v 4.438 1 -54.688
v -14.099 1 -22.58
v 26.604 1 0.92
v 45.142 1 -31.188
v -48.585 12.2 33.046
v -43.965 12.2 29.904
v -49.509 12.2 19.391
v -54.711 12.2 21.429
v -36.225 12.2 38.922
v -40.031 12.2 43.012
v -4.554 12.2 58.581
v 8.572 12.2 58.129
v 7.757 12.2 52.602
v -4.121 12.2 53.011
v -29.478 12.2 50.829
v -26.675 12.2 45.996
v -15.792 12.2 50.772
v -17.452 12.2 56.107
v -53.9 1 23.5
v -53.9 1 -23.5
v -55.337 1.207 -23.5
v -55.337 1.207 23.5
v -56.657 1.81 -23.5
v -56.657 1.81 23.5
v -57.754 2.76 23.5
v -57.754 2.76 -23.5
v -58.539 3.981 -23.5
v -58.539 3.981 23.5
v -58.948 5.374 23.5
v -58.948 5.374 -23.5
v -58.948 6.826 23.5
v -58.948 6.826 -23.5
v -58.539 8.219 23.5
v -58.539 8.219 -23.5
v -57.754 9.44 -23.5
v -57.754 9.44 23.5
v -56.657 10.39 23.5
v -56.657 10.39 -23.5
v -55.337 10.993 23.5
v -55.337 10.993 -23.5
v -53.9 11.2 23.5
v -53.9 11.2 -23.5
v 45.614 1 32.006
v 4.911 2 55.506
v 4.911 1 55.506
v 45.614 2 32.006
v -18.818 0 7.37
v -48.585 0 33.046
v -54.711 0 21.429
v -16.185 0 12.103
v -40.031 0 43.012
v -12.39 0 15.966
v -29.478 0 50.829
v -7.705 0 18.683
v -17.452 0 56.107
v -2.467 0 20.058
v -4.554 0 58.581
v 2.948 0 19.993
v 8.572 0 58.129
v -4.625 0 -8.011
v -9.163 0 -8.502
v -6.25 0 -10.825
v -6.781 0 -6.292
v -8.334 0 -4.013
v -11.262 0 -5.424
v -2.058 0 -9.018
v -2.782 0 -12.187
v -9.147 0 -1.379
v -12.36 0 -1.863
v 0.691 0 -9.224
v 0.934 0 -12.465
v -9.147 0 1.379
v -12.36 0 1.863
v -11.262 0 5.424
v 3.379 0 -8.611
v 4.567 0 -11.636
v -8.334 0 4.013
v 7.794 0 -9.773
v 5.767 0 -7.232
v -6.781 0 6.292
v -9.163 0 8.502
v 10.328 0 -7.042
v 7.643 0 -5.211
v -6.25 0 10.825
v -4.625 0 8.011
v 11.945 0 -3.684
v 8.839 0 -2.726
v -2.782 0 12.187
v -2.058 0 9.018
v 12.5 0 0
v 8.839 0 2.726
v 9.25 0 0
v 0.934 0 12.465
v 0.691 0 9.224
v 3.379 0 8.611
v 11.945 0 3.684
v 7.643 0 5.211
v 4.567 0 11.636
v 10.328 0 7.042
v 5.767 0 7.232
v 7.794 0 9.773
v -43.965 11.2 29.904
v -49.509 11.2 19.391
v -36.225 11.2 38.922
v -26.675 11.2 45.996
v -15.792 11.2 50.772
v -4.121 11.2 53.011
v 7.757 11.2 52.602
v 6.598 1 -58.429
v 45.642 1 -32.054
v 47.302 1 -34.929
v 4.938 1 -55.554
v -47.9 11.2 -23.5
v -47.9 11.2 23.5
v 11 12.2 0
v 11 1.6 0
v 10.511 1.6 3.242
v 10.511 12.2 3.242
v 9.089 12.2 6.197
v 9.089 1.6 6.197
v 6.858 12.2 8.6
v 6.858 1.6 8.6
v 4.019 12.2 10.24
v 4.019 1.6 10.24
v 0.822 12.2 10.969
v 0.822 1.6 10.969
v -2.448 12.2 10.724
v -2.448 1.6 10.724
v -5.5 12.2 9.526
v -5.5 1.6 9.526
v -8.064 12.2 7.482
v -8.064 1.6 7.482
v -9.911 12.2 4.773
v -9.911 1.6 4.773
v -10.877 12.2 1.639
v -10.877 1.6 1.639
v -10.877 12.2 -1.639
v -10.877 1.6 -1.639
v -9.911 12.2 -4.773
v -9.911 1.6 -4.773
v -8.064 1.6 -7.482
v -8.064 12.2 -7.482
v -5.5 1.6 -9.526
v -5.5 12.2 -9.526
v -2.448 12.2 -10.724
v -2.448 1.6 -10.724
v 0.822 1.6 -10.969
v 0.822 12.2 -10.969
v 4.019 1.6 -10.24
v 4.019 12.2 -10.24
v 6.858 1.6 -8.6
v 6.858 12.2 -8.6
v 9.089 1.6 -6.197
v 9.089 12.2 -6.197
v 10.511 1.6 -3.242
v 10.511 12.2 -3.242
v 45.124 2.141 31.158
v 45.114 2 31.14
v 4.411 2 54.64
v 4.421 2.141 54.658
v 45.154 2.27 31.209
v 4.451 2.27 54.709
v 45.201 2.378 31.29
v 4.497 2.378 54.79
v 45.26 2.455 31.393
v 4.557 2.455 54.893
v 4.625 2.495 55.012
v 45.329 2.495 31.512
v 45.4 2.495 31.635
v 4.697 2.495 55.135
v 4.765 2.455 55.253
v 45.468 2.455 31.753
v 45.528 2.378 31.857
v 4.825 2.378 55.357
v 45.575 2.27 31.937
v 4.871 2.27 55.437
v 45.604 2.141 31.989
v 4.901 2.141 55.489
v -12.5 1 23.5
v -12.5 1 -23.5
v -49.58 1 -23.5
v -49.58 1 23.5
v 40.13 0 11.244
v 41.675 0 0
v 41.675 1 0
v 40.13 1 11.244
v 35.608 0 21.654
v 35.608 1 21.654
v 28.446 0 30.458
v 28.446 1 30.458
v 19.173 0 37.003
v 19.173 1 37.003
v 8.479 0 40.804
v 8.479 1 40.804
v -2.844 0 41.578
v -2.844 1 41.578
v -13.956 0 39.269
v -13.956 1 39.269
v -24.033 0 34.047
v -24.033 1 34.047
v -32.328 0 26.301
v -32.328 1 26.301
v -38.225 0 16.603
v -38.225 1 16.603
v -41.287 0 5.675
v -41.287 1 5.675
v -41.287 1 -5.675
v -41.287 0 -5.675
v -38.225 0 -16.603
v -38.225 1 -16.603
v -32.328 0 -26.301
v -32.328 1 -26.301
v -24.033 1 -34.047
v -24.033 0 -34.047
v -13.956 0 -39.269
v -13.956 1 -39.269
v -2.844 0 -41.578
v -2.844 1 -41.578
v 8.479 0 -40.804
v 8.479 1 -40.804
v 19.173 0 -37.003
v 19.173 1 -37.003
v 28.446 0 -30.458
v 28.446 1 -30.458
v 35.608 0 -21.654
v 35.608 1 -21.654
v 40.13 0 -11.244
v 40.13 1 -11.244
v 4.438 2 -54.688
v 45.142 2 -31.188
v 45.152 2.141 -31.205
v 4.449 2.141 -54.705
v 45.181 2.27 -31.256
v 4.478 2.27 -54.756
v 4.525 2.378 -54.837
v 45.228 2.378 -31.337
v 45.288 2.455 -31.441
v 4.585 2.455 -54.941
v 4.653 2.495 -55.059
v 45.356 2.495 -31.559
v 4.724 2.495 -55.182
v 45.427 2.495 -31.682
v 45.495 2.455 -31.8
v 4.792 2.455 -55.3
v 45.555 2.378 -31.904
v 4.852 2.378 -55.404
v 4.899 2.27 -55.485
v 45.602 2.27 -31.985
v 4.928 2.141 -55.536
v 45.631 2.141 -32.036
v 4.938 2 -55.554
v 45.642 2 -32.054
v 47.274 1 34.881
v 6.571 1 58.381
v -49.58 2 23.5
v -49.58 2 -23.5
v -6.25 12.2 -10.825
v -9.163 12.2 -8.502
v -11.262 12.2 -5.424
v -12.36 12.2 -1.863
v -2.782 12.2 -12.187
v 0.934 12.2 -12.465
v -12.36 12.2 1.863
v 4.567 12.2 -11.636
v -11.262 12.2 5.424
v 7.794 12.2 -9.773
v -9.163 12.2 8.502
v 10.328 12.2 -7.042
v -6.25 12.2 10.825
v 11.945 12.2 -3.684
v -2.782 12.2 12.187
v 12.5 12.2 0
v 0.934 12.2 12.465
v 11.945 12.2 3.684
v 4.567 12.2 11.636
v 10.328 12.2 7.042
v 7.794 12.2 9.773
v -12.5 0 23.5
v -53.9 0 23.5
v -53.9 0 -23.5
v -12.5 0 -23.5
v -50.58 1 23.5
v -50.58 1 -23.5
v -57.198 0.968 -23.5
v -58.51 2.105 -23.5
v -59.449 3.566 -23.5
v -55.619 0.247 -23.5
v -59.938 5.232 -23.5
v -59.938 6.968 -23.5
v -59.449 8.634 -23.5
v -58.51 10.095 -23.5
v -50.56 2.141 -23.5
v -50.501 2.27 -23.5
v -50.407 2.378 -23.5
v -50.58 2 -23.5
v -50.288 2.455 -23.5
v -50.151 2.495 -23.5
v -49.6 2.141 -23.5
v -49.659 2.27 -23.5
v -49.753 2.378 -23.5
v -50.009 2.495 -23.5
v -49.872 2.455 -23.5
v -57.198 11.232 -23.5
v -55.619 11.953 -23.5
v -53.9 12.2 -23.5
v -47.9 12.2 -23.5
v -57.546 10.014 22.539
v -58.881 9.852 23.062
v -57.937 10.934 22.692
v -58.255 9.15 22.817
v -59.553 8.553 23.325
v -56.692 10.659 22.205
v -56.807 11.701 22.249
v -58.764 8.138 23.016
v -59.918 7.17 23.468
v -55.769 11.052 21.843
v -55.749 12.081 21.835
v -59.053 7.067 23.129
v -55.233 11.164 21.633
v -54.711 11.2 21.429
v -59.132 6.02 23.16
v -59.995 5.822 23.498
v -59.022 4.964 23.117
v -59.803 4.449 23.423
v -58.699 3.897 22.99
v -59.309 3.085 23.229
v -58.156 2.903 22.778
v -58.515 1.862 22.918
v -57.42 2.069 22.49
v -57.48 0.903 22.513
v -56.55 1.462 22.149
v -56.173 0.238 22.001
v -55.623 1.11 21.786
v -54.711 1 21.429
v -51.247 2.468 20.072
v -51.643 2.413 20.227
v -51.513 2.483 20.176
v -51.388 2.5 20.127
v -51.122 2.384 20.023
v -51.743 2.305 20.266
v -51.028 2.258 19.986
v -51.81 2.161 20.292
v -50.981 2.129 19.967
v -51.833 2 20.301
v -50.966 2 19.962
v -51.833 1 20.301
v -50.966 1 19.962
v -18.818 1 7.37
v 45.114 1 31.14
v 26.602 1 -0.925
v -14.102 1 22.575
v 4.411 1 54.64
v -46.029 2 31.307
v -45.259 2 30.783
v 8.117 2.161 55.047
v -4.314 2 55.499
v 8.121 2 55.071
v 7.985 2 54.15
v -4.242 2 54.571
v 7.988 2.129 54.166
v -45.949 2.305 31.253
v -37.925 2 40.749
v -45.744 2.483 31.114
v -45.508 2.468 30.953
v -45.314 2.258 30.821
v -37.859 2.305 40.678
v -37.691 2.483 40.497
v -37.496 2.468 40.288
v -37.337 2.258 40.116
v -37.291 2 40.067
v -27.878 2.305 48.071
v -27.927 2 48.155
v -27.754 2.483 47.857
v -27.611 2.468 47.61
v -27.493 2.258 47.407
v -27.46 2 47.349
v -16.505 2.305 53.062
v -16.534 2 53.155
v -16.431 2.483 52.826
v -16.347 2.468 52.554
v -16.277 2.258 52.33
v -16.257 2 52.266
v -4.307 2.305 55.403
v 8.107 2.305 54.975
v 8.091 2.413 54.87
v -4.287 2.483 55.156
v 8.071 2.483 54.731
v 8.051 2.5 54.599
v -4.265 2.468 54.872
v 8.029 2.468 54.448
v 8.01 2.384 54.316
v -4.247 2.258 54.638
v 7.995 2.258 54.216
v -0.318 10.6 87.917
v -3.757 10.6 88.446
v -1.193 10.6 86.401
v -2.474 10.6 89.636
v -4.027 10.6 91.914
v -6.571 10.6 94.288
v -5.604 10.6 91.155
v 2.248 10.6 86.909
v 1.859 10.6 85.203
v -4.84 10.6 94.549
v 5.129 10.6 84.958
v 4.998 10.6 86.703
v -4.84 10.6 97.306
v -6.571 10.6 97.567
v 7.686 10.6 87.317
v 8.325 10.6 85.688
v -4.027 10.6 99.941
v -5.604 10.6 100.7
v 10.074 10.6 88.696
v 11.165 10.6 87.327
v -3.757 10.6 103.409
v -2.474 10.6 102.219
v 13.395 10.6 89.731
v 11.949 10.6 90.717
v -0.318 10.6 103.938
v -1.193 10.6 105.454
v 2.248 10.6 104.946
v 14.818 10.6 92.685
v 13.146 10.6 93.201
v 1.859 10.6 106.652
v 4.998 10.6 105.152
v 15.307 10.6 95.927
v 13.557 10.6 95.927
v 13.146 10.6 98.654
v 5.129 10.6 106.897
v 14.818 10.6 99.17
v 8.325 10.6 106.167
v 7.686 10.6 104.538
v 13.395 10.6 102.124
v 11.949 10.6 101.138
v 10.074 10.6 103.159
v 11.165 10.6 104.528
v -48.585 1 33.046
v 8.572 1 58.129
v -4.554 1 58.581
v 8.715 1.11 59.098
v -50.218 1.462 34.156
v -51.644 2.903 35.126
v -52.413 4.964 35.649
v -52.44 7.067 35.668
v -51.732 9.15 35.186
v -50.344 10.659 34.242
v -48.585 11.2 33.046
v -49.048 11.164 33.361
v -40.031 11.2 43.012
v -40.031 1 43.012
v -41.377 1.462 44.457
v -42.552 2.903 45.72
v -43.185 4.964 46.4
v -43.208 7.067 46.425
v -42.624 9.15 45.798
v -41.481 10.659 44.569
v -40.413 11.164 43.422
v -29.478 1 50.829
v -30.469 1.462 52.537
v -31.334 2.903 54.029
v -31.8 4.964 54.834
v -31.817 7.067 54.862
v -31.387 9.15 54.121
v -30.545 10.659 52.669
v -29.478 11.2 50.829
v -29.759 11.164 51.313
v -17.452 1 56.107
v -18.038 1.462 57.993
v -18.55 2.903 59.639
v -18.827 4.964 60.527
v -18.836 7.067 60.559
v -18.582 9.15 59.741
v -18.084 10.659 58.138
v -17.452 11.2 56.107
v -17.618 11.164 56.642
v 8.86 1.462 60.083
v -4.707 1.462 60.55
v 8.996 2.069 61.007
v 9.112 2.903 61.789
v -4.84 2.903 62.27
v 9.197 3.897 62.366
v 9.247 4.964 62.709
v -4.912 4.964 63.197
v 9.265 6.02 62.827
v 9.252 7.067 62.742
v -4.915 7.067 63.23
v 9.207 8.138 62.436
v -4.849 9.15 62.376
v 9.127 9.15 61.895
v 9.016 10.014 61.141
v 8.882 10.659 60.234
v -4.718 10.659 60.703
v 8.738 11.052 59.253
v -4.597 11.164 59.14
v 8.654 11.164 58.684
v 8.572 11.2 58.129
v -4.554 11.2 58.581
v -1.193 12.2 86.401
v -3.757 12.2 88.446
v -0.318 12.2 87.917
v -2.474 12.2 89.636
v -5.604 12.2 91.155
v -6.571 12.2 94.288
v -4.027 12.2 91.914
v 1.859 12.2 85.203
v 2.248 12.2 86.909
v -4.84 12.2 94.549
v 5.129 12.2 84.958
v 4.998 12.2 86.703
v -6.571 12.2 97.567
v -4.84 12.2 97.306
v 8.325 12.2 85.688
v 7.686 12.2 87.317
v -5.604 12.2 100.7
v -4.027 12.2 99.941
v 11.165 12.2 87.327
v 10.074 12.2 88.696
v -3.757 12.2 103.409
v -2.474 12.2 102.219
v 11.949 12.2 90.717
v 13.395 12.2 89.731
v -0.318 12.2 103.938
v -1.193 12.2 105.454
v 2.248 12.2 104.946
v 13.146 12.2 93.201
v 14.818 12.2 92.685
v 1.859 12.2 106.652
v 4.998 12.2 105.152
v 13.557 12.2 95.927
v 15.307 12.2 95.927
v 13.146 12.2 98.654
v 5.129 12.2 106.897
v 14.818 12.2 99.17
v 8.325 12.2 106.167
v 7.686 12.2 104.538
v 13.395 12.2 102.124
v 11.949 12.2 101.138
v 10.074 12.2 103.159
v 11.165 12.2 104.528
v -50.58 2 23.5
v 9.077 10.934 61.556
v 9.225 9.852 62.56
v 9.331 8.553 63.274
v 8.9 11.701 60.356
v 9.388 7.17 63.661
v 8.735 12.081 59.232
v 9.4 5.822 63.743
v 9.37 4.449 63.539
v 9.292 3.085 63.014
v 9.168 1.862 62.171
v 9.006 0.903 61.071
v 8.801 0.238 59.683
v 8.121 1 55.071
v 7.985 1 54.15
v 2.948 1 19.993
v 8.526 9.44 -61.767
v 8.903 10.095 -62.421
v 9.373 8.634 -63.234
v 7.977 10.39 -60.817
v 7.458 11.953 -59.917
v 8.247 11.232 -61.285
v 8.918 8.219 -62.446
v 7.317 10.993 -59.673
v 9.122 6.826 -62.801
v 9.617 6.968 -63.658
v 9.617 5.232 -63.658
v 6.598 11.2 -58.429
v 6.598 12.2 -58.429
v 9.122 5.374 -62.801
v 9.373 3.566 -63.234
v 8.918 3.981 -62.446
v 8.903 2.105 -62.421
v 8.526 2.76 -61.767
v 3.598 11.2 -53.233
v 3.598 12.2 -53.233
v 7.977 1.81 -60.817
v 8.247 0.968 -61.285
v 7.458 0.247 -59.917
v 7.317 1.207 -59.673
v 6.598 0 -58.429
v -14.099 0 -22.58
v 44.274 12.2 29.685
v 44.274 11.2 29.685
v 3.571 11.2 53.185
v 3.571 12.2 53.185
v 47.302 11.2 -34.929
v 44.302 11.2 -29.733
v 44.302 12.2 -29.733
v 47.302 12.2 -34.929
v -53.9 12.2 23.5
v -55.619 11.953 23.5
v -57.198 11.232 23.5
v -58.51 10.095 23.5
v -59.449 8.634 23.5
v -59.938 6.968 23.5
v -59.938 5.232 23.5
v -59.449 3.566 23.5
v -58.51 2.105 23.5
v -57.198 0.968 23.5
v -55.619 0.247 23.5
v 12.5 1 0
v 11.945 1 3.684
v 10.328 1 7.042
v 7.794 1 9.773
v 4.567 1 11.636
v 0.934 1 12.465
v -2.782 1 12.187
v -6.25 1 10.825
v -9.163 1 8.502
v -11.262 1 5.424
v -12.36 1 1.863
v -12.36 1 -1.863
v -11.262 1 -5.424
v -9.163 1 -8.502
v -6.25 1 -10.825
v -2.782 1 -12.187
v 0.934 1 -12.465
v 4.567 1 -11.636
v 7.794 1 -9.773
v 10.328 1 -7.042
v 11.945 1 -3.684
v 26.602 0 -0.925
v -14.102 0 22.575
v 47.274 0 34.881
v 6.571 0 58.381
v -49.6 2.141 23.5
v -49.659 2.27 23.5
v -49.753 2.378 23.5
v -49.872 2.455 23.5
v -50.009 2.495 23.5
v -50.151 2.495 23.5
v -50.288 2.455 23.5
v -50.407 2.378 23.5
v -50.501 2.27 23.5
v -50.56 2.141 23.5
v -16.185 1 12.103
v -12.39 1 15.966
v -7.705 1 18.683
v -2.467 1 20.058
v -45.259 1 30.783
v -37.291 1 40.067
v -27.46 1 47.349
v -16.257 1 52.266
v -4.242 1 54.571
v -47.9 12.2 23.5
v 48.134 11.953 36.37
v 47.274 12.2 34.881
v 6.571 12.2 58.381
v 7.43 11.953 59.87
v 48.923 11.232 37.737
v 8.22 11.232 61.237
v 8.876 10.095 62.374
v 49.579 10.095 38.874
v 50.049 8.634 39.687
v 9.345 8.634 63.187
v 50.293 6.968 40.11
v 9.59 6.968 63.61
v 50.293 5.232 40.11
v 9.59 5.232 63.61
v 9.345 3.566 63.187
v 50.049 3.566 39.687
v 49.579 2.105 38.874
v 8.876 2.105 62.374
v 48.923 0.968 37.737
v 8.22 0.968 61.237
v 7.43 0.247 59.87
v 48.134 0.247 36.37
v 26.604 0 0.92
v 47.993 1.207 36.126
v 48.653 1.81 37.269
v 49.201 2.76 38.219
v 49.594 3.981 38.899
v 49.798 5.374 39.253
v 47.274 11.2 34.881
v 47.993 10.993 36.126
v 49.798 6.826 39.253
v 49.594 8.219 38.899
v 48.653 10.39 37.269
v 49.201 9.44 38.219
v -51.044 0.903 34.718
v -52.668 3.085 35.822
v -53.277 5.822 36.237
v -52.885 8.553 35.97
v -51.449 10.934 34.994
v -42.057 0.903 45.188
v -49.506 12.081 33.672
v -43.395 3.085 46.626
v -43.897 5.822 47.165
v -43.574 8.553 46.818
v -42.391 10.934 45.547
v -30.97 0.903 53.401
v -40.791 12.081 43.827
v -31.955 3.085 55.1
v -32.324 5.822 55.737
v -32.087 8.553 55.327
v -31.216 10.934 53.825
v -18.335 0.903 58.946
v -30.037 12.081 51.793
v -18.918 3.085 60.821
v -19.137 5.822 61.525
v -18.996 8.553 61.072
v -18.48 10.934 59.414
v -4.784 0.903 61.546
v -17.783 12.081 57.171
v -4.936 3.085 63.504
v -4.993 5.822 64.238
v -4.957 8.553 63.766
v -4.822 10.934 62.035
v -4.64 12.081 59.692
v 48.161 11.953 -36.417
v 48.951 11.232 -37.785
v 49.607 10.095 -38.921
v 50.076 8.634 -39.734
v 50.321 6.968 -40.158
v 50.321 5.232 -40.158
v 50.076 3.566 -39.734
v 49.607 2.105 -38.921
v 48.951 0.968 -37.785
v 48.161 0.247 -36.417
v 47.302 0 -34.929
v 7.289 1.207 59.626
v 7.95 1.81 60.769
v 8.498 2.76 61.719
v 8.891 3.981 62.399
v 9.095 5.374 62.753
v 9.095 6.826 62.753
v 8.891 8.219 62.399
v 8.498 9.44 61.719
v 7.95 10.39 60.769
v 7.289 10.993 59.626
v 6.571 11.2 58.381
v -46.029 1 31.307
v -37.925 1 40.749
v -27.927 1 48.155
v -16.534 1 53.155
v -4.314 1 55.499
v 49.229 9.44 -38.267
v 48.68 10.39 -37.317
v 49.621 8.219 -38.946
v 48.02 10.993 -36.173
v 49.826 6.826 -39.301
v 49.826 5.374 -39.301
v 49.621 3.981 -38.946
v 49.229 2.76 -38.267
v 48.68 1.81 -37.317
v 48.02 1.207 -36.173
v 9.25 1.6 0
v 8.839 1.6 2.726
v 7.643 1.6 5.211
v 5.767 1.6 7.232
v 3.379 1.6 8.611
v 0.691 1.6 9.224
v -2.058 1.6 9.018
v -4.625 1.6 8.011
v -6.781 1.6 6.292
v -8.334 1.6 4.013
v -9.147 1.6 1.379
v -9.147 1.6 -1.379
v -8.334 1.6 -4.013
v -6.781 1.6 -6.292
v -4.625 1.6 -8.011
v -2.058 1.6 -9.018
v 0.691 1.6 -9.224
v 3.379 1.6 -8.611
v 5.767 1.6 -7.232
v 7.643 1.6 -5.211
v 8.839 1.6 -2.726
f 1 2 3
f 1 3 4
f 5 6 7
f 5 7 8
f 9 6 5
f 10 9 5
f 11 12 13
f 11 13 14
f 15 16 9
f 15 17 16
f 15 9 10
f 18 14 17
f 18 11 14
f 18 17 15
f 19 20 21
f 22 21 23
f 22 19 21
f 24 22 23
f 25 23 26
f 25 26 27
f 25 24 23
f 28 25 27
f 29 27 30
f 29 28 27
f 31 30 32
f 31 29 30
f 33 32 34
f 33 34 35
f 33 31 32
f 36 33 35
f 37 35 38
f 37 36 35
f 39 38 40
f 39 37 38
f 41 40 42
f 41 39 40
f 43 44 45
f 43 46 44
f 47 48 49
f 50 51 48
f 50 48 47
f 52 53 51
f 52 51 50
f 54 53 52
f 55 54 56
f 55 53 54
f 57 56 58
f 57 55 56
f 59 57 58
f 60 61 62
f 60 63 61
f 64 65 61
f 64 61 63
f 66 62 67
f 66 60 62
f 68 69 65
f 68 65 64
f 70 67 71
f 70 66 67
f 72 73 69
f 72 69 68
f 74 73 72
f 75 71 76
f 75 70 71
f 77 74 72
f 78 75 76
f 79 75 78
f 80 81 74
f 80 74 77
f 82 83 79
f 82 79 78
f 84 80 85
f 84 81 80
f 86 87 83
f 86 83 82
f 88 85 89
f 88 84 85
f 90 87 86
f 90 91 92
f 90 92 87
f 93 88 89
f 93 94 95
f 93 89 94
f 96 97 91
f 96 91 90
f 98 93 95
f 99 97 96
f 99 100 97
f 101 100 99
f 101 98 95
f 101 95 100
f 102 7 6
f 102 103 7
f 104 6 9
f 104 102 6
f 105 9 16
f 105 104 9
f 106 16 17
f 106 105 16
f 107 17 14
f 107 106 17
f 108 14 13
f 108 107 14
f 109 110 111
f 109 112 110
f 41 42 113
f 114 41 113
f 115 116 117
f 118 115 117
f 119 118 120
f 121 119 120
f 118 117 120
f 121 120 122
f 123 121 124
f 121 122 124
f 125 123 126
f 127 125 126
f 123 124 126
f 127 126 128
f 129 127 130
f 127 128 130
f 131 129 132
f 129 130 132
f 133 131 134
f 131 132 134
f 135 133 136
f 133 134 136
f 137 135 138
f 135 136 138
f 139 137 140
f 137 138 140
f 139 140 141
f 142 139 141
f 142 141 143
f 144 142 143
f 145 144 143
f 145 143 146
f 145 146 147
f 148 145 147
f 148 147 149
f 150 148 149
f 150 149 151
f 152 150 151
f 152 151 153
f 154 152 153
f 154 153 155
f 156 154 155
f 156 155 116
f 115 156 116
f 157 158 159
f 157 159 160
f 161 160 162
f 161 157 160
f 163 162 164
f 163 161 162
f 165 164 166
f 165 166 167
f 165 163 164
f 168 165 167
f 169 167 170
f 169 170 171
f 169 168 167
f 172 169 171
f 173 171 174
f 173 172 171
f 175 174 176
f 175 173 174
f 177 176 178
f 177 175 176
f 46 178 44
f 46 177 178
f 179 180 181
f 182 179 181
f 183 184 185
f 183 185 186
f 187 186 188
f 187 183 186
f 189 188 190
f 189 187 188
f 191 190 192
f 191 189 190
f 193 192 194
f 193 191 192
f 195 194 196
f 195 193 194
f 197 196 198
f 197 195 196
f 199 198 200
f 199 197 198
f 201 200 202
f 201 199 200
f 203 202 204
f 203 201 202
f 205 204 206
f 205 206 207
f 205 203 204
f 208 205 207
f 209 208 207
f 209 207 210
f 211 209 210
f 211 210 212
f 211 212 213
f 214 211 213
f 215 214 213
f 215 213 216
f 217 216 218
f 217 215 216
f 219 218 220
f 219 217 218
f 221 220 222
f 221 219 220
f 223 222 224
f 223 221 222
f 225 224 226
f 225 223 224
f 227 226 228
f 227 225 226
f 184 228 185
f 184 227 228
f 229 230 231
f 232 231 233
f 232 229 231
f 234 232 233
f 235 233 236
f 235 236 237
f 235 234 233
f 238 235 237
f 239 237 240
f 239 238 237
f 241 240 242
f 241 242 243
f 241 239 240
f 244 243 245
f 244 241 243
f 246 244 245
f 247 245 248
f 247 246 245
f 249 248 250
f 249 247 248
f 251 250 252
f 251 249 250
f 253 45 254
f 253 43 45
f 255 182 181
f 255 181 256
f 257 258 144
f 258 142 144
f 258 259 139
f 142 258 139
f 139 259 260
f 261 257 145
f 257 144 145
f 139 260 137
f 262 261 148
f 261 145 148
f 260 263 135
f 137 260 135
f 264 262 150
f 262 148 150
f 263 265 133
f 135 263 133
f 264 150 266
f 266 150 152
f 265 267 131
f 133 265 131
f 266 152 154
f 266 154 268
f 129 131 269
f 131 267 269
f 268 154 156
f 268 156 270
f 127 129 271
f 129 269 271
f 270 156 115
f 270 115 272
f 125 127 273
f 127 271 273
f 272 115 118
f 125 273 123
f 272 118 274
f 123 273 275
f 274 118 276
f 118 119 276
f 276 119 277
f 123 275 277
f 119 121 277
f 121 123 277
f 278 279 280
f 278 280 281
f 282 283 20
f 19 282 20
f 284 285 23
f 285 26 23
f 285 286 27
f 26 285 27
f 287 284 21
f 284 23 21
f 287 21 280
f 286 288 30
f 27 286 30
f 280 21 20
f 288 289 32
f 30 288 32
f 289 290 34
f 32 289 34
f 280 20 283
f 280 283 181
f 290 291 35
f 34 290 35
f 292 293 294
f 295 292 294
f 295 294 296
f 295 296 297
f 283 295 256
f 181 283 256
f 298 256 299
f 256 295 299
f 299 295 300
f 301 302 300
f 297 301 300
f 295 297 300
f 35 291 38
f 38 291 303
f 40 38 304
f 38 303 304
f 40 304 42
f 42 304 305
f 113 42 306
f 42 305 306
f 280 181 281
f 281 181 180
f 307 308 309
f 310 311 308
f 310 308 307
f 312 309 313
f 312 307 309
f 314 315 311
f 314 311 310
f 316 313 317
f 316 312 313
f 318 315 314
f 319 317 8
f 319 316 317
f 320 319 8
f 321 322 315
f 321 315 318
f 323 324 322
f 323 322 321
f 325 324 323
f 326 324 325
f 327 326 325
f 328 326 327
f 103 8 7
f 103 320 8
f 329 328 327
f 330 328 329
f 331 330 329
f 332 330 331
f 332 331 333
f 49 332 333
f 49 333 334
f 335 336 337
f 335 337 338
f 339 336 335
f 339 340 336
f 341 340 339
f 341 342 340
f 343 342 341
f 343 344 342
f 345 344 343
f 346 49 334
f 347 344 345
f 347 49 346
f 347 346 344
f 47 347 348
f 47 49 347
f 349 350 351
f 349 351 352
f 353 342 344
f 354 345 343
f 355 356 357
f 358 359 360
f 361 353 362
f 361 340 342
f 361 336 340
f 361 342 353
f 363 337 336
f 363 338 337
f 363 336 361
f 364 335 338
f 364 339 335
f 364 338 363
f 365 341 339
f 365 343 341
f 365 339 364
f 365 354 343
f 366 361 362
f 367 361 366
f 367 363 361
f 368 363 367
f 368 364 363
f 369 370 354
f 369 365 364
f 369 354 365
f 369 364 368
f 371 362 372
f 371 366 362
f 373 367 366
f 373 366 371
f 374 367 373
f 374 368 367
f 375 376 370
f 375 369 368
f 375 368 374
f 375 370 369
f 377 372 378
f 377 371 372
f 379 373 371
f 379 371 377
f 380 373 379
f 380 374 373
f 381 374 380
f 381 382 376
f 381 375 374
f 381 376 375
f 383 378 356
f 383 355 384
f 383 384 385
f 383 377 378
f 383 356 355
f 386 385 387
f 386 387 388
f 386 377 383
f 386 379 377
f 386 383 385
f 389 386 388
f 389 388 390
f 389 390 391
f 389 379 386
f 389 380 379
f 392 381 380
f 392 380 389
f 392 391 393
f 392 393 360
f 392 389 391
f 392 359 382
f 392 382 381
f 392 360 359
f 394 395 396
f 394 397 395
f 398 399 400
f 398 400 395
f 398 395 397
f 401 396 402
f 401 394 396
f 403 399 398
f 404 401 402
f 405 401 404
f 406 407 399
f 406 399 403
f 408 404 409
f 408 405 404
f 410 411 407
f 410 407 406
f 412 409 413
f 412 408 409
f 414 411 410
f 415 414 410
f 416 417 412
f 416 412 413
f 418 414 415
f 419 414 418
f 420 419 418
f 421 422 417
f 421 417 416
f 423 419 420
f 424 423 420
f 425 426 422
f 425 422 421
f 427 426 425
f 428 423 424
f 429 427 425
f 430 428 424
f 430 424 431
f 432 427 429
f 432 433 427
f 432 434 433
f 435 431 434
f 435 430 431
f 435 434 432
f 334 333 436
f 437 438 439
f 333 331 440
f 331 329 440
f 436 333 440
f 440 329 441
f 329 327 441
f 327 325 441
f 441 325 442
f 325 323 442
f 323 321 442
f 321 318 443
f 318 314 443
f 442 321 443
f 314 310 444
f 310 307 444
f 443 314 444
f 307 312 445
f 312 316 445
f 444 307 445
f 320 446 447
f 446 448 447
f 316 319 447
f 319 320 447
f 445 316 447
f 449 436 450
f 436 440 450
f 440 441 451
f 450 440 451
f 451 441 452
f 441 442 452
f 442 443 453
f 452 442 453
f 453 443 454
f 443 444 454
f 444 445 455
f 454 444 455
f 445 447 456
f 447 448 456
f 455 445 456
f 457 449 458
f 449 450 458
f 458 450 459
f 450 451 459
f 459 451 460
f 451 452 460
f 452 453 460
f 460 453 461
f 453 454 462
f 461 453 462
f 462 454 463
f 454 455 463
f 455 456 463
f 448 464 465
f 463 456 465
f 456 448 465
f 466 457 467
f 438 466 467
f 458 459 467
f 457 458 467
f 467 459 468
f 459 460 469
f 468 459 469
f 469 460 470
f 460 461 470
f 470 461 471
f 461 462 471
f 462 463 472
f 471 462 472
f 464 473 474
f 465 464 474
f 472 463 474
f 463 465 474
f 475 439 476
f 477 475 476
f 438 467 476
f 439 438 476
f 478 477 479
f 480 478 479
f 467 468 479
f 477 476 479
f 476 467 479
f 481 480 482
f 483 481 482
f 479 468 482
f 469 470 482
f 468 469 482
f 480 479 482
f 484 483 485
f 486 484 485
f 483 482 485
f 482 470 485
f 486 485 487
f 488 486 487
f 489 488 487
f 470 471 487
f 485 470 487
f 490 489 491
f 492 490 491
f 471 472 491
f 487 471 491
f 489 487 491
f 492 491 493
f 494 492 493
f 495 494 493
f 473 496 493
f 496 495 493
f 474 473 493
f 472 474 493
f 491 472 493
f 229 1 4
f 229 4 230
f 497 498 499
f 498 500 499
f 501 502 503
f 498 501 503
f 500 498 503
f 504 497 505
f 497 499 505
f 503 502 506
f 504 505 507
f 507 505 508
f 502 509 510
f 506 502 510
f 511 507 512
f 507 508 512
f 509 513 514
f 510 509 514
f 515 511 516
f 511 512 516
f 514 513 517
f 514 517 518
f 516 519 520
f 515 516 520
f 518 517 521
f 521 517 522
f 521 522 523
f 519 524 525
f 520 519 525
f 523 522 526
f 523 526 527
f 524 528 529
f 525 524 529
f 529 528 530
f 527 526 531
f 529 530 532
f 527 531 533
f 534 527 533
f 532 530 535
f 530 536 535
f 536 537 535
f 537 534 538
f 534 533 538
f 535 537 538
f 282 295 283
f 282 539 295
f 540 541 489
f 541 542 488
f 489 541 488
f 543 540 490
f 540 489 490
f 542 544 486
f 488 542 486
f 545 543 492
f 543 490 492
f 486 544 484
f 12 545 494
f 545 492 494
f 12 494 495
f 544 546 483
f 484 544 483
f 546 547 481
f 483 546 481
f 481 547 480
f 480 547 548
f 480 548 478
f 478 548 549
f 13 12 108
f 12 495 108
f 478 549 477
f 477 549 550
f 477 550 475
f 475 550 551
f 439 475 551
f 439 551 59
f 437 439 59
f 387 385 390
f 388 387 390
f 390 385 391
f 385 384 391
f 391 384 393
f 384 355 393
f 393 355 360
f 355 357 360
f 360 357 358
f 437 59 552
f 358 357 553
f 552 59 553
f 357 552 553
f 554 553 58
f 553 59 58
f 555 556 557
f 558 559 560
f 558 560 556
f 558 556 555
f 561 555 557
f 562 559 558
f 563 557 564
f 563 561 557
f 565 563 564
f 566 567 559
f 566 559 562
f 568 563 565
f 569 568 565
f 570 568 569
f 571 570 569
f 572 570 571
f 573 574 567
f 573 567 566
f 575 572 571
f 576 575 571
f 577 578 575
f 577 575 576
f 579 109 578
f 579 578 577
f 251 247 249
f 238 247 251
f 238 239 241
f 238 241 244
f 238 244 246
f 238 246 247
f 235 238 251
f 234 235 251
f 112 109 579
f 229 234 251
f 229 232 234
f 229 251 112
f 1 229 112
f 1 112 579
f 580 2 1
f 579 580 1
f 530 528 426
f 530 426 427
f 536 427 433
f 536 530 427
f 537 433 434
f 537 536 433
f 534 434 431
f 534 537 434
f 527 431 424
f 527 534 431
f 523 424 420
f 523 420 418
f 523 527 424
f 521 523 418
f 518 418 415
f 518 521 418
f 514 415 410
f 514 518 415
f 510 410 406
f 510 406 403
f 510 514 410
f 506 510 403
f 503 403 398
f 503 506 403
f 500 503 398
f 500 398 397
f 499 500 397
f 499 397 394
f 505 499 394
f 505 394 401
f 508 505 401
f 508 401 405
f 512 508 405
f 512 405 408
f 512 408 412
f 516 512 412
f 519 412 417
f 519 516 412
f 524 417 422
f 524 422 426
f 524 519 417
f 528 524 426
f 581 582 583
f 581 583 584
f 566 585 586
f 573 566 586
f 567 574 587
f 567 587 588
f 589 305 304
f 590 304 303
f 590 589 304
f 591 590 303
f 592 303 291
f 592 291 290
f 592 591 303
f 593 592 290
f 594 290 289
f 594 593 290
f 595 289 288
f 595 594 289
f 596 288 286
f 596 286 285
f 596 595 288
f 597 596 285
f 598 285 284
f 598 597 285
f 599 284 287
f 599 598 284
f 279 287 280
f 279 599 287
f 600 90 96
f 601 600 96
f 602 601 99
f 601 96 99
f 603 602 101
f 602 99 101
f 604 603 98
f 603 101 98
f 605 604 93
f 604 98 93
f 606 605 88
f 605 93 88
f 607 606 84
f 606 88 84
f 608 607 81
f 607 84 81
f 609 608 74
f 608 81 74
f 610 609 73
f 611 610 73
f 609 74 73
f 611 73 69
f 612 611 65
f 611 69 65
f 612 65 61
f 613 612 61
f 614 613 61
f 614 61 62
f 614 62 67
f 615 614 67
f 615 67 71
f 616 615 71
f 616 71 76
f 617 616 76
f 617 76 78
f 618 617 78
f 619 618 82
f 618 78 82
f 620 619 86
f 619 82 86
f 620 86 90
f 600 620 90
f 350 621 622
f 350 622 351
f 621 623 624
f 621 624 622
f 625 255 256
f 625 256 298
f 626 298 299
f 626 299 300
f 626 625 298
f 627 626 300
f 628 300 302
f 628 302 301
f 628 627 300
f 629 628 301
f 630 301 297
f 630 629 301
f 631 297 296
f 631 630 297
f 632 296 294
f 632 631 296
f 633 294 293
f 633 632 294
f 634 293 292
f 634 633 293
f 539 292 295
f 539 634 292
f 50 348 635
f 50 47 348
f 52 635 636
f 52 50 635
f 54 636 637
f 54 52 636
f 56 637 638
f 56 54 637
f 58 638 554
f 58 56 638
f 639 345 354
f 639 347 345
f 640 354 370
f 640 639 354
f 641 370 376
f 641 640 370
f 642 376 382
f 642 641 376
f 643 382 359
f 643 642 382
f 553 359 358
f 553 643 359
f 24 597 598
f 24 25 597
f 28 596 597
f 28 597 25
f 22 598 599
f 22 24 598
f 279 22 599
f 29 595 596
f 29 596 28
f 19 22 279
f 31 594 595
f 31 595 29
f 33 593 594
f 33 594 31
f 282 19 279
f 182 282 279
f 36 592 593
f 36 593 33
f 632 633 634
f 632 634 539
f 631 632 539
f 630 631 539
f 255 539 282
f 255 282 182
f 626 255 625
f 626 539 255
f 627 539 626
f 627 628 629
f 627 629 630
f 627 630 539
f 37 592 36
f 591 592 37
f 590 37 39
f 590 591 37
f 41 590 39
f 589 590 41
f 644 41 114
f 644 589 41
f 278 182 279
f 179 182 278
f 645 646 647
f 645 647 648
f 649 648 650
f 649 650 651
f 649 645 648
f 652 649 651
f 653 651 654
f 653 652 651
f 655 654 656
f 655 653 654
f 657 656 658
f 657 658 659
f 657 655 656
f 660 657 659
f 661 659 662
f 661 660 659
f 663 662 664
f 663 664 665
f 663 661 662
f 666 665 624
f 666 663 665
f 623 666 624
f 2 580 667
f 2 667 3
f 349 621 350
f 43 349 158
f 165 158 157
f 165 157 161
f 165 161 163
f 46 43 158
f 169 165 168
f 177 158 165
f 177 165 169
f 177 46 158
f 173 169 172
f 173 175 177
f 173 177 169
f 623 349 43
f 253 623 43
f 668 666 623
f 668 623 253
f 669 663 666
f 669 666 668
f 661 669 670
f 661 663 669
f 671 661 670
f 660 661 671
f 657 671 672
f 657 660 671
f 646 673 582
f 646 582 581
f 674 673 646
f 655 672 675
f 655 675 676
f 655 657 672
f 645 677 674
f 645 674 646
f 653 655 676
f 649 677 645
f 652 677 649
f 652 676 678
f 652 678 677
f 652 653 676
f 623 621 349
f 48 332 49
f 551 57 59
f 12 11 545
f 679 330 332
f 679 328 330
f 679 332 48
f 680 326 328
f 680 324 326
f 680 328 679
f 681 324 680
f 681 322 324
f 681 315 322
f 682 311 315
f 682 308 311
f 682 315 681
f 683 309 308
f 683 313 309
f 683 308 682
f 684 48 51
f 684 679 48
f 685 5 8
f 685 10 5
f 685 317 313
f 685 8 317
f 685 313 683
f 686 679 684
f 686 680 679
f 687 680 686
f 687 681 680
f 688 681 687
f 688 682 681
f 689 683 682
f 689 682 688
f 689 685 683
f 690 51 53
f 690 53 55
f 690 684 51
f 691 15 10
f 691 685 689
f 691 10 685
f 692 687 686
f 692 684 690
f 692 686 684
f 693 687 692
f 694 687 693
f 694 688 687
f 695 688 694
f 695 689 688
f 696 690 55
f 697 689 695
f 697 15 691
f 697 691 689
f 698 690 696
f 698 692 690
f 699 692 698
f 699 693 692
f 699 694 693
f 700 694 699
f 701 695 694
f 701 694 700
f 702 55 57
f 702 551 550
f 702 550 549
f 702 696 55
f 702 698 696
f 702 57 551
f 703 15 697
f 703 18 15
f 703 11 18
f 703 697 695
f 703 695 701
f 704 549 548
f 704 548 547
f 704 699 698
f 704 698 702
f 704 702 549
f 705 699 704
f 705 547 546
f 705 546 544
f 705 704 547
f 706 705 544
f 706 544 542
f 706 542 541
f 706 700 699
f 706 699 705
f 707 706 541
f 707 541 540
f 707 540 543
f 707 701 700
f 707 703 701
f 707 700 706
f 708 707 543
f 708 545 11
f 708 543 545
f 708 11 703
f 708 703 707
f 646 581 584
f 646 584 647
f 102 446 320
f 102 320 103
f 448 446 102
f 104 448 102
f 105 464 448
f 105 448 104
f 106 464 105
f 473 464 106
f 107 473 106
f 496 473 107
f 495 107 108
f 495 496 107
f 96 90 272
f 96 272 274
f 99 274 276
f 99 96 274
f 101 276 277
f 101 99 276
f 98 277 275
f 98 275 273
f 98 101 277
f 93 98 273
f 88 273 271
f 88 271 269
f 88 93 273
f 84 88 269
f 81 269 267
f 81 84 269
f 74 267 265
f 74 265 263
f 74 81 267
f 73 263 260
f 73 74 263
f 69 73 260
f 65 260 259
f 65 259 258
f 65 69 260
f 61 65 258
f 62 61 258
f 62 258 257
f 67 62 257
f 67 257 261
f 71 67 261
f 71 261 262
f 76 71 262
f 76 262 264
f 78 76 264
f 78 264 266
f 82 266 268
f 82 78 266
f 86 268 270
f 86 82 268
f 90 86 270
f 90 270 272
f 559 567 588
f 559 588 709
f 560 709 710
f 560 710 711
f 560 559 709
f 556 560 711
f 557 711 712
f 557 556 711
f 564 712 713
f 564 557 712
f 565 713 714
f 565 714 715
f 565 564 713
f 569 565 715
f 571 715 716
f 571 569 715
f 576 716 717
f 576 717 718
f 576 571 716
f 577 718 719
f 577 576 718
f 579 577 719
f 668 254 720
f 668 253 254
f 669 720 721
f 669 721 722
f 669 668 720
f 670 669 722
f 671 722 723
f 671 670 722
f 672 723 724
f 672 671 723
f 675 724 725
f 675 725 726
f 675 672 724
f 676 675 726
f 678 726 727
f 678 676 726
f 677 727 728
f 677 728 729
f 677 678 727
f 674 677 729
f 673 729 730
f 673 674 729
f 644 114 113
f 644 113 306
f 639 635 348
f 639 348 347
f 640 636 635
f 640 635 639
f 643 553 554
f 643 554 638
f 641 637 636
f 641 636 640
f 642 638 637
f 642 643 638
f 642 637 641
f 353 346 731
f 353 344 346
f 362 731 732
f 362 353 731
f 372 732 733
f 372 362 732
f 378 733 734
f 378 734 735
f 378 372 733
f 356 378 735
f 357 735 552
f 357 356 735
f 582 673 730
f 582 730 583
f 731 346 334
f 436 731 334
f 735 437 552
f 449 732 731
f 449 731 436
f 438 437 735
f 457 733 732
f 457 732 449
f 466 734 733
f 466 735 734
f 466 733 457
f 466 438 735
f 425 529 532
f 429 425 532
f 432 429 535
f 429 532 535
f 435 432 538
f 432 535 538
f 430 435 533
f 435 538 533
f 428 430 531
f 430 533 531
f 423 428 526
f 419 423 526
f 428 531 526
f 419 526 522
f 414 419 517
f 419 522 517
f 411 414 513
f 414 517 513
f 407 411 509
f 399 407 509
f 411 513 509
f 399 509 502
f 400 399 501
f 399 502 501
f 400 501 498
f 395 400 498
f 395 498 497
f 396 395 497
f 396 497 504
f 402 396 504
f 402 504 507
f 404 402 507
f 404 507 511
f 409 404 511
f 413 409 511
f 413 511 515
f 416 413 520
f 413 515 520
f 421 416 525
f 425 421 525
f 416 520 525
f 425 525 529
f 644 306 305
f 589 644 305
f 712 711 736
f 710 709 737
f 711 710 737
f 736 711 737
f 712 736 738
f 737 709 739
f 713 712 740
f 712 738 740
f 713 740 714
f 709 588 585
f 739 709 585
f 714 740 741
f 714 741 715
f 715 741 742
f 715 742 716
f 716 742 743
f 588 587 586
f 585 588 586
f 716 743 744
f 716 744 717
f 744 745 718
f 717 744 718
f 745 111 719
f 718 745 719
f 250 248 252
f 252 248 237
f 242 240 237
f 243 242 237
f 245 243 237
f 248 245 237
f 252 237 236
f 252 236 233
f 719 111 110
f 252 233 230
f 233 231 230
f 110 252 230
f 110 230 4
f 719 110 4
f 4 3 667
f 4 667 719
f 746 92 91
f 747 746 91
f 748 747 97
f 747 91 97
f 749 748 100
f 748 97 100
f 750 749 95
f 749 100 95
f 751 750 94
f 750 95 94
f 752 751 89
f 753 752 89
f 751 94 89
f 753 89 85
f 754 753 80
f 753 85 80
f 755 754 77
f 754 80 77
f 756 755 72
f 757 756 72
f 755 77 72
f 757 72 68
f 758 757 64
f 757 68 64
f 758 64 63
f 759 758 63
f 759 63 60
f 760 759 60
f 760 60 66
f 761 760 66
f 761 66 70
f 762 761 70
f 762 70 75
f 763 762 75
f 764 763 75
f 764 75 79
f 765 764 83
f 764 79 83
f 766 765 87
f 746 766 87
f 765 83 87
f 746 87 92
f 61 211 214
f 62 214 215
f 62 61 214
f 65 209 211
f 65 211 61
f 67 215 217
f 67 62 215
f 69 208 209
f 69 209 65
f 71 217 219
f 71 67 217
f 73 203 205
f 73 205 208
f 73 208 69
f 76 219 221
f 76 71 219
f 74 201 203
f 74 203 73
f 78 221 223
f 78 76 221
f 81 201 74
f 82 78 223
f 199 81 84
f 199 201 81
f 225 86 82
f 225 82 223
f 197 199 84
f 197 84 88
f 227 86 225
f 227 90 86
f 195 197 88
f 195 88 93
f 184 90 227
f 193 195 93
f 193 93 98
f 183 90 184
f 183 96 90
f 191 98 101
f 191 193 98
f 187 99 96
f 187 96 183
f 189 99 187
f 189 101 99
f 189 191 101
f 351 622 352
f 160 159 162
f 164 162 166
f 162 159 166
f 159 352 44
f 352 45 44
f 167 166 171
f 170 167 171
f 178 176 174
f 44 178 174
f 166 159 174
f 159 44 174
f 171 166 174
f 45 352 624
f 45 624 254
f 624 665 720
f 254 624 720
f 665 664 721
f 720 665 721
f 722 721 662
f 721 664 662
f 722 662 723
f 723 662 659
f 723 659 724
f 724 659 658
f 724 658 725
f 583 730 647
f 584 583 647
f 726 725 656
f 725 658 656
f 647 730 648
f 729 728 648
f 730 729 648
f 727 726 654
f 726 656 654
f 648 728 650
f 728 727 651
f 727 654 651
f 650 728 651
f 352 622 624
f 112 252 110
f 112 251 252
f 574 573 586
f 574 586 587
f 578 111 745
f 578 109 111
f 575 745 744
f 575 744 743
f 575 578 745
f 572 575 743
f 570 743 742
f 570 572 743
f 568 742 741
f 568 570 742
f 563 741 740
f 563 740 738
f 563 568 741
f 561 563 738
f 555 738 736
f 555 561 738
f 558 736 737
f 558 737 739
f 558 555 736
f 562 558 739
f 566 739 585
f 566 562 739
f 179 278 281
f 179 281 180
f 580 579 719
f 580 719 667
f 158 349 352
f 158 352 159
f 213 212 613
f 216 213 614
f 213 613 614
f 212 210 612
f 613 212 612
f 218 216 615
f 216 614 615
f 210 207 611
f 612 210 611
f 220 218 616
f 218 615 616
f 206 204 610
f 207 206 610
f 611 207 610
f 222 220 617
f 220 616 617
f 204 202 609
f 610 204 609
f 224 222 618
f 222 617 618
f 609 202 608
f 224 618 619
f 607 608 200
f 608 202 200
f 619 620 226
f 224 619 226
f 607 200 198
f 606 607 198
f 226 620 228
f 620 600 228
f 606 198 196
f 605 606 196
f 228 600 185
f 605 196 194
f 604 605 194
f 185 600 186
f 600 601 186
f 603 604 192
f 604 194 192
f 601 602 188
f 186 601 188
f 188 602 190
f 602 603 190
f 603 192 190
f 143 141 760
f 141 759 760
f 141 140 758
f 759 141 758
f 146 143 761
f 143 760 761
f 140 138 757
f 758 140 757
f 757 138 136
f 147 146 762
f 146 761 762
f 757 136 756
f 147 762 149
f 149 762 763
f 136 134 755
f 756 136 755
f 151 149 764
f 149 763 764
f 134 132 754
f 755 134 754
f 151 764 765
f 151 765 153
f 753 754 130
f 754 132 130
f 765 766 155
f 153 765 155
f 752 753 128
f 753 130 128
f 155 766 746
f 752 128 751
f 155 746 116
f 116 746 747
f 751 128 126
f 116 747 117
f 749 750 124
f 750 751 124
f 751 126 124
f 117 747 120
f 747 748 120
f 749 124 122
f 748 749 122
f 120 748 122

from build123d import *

# Parameters (mm, degrees)
F0_R      = 12.5
F0_R_2    = 11
F1_DEPTH  = 12.2
F3_DEPTH  = 23.5
F7_DEPTH  = 23.5
F11_DEPTH = 23.5
F13_R     = 11
F14_DEPTH = 25
F0_R_3    = 9.25
F15_DEPTH = 1.6
F20_ANGLE = 77
F13_R_2   = 9.25
F22_DEPTH = 1.6
F0_R_4    = 41.6752373002
F0_R_5    = 20.5615525182
F23_DEPTH = 1


with BuildPart() as f1:
    # F0 (on Front) → F1 (new body)
    with BuildSketch(Plane.XZ):
        Circle(F0_R)
        Circle(F0_R_2, mode=Mode.SUBTRACT)
    extrude(amount=-F1_DEPTH)

    # F13 (on offset) → F14 (cut)
    with BuildSketch(Plane.XZ.offset(-12.2)):
        Circle(F13_R)
    extrude(amount=F14_DEPTH, mode=Mode.SUBTRACT)

    # F0 (on Front) → F15 (join)
    with BuildSketch(Plane.XZ):
        Circle(F0_R_2)
        Circle(F0_R_3, mode=Mode.SUBTRACT)
    extrude(amount=-F15_DEPTH)


with BuildPart() as f3:
    # F2 (on Top) → F3 (new body, symmetric)
    with BuildSketch(Plane.XY):
        with BuildLine():
            ThreePointArc((-53.9000045358, 1), (-59.0000045358, 6.1), (-53.9000045358, 11.2))
            Line((-53.9000045358, 11.2), (-47.9000045358, 11.2))
            Line((-47.9000045358, 11.2), (-47.9000045358, 12.2))
            Line((-47.9000045358, 12.2), (-53.9000045358, 12.2))
            ThreePointArc((-53.9000045358, 12.2), (-60.0000045358, 6.1), (-53.9000045358, 0))
            Line((-53.9000045358, 0), (-49.58, 0))
            Line((-49.58, 0), (-12.5, 0))
            Line((-12.5, 0), (-12.5, 1))
            Line((-12.5, 1), (-49.58, 1))
            Line((-49.58, 1), (-49.58, 2))
            ThreePointArc((-49.58, 2), (-50.08, 2.5), (-50.58, 2))
            Line((-50.58, 2), (-50.58, 1))
            Line((-50.58, 1), (-53.9000045358, 1))
        make_face()
    extrude(amount=F3_DEPTH, both=True)


with BuildPart() as f7:
    # F6 (on line) → F7 (new body, symmetric)
    with BuildSketch(Plane(origin=(0, 0, 0), x_dir=(0, -1, 0), z_dir=(-0.8660254038, 0, -0.5))):
        with BuildLine():
            ThreePointArc((-1, -53.9000045358), (-6.1, -59.0000045358), (-11.2, -53.9000045358))
            Line((-11.2, -53.9000045358), (-11.2, -47.9000045358))
            Line((-11.2, -47.9000045358), (-12.2, -47.9000045358))
            Line((-12.2, -47.9000045358), (-12.2, -53.9000045358))
            ThreePointArc((-12.2, -53.9000045358), (-6.1, -60.0000045358), (0, -53.9000045358))
            Line((0, -53.9000045358), (0, -49.58))
            Line((0, -49.58), (0, -12.5049466592))
            Line((0, -12.5049466592), (-1, -12.5049466592))
            Line((-1, -12.5049466592), (-1, -49.58))
            Line((-1, -49.58), (-2, -49.58))
            ThreePointArc((-2, -49.58), (-2.5, -50.08), (-2, -50.58))
            Line((-2, -50.58), (-1, -50.58))
            Line((-1, -50.58), (-1, -53.9000045358))
        make_face()
    extrude(amount=F7_DEPTH, both=True)


with BuildPart() as f11:
    # F10 (on line) → F11 (new body, symmetric)
    with BuildSketch(Plane(origin=(0, 0, 0), x_dir=(0, 1, 0), z_dir=(0.8660254038, 0, -0.5))):
        with BuildLine():
            ThreePointArc((1, 53.845282644), (6.1, 58.945282644), (11.2, 53.845282644))
            Line((11.2, 53.845282644), (11.2, 47.845282644))
            Line((11.2, 47.845282644), (12.2, 47.845282644))
            Line((12.2, 47.845282644), (12.2, 53.845282644))
            ThreePointArc((12.2, 53.845282644), (6.1, 59.945282644), (0, 53.845282644))
            Line((0, 53.845282644), (0, 49.5252781083))
            Line((0, 49.5252781083), (0, 12.5))
            Line((0, 12.5), (1, 12.5))
            Line((1, 12.5), (1, 49.5252781083))
            Line((1, 49.5252781083), (2, 49.5252781083))
            ThreePointArc((2, 49.5252781083), (2.5, 50.0252781083), (2, 50.5252781083))
            Line((2, 50.5252781083), (1, 50.5252781083))
            Line((1, 50.5252781083), (1, 53.845282644))
        make_face()
    extrude(amount=F11_DEPTH, both=True)


with BuildPart() as f20:
    # F19 (on face) → F20 (revolve)
    with BuildSketch(Plane(origin=(0, 0, 0), x_dir=(0.9311282508, 0, -0.3646918982), z_dir=(-0.3646918982, 0, -0.9311282508))):
        with BuildLine():
            Line((-20.2093627427, 0), (-58.7580765478, 0))
            add(Edge.make_bspline(
                [(-58.7580765478, 0), (-64.4379588775, 0), (-64.4379588775, -6.1), (-64.4379588775, -12.2), (-58.7580765478, -12.2)],
                knots=[0, 0, 0, 1.5707963268, 1.5707963268, 3.1415926536, 3.1415926536, 3.1415926536], degree=2, weights=[1, 0.7071067812, 1, 0.7071067812, 1]))
            Line((-58.7580765478, -12.2), (-53.1713070432, -12.2))
            Line((-53.1713070432, -12.2), (-53.1713070432, -11.2))
            Line((-53.1713070432, -11.2), (-58.7580765478, -11.2))
            add(Edge.make_bspline(
                [(-58.7580765478, -1), (-63.5068306267, -1), (-63.5068306267, -6.1), (-63.5068306267, -11.2), (-58.7580765478, -11.2)],
                knots=[3.1415926536, 3.1415926536, 3.1415926536, 4.7123889804, 4.7123889804, 6.2831853072, 6.2831853072, 6.2831853072], degree=2, weights=[1, 0.7071067812, 1, 0.7071067812, 1]))
            Line((-58.7580765478, -1), (-55.6667265319, -1))
            Line((-55.6667265319, -1), (-55.6667265319, -2))
            add(Edge.make_bspline(
                [(-55.6667265319, -2), (-55.6667265319, -2.5), (-55.2011624065, -2.5), (-54.7355982811, -2.5), (-54.7355982811, -2)],
                knots=[1.5707963268, 1.5707963268, 1.5707963268, 3.1415926536, 3.1415926536, 4.7123889804, 4.7123889804, 4.7123889804], degree=2, weights=[1, 0.7071067812, 1, 0.7071067812, 1]))
            Line((-54.7355982811, -2), (-54.7355982811, -1))
            Line((-54.7355982811, -1), (-20.2093627427, -1))
            Line((-20.2093627427, -1), (-20.2093627427, 0))
        make_face()
    revolve(axis=Axis((0, -18.8117902726, 0), (0, 1, 0)), revolution_arc=F20_ANGLE)


with BuildPart() as f22:
    # F13 (on offset) → F22 (new body)
    with BuildSketch(Plane.XZ.offset(-12.2)):
        with Locations((4.3065343052, 95.9274619818)):
            Circle(F13_R)
        with Locations((4.3065343052, 95.9274619818)):
            Circle(F13_R_2, mode=Mode.SUBTRACT)
    extrude(amount=F22_DEPTH)


with BuildPart() as f23:
    # F0 (on Front) → F23 (new body)
    with BuildSketch(Plane.XZ):
        Circle(F0_R_4)
        Circle(F0_R_5, mode=Mode.SUBTRACT)
        Circle(F0_R_5)
        Circle(F0_R, mode=Mode.SUBTRACT)
    extrude(amount=-F23_DEPTH)


solid = Compound([f1.part, f3.part, f7.part, f11.part, f20.part, f22.part, f23.part])
